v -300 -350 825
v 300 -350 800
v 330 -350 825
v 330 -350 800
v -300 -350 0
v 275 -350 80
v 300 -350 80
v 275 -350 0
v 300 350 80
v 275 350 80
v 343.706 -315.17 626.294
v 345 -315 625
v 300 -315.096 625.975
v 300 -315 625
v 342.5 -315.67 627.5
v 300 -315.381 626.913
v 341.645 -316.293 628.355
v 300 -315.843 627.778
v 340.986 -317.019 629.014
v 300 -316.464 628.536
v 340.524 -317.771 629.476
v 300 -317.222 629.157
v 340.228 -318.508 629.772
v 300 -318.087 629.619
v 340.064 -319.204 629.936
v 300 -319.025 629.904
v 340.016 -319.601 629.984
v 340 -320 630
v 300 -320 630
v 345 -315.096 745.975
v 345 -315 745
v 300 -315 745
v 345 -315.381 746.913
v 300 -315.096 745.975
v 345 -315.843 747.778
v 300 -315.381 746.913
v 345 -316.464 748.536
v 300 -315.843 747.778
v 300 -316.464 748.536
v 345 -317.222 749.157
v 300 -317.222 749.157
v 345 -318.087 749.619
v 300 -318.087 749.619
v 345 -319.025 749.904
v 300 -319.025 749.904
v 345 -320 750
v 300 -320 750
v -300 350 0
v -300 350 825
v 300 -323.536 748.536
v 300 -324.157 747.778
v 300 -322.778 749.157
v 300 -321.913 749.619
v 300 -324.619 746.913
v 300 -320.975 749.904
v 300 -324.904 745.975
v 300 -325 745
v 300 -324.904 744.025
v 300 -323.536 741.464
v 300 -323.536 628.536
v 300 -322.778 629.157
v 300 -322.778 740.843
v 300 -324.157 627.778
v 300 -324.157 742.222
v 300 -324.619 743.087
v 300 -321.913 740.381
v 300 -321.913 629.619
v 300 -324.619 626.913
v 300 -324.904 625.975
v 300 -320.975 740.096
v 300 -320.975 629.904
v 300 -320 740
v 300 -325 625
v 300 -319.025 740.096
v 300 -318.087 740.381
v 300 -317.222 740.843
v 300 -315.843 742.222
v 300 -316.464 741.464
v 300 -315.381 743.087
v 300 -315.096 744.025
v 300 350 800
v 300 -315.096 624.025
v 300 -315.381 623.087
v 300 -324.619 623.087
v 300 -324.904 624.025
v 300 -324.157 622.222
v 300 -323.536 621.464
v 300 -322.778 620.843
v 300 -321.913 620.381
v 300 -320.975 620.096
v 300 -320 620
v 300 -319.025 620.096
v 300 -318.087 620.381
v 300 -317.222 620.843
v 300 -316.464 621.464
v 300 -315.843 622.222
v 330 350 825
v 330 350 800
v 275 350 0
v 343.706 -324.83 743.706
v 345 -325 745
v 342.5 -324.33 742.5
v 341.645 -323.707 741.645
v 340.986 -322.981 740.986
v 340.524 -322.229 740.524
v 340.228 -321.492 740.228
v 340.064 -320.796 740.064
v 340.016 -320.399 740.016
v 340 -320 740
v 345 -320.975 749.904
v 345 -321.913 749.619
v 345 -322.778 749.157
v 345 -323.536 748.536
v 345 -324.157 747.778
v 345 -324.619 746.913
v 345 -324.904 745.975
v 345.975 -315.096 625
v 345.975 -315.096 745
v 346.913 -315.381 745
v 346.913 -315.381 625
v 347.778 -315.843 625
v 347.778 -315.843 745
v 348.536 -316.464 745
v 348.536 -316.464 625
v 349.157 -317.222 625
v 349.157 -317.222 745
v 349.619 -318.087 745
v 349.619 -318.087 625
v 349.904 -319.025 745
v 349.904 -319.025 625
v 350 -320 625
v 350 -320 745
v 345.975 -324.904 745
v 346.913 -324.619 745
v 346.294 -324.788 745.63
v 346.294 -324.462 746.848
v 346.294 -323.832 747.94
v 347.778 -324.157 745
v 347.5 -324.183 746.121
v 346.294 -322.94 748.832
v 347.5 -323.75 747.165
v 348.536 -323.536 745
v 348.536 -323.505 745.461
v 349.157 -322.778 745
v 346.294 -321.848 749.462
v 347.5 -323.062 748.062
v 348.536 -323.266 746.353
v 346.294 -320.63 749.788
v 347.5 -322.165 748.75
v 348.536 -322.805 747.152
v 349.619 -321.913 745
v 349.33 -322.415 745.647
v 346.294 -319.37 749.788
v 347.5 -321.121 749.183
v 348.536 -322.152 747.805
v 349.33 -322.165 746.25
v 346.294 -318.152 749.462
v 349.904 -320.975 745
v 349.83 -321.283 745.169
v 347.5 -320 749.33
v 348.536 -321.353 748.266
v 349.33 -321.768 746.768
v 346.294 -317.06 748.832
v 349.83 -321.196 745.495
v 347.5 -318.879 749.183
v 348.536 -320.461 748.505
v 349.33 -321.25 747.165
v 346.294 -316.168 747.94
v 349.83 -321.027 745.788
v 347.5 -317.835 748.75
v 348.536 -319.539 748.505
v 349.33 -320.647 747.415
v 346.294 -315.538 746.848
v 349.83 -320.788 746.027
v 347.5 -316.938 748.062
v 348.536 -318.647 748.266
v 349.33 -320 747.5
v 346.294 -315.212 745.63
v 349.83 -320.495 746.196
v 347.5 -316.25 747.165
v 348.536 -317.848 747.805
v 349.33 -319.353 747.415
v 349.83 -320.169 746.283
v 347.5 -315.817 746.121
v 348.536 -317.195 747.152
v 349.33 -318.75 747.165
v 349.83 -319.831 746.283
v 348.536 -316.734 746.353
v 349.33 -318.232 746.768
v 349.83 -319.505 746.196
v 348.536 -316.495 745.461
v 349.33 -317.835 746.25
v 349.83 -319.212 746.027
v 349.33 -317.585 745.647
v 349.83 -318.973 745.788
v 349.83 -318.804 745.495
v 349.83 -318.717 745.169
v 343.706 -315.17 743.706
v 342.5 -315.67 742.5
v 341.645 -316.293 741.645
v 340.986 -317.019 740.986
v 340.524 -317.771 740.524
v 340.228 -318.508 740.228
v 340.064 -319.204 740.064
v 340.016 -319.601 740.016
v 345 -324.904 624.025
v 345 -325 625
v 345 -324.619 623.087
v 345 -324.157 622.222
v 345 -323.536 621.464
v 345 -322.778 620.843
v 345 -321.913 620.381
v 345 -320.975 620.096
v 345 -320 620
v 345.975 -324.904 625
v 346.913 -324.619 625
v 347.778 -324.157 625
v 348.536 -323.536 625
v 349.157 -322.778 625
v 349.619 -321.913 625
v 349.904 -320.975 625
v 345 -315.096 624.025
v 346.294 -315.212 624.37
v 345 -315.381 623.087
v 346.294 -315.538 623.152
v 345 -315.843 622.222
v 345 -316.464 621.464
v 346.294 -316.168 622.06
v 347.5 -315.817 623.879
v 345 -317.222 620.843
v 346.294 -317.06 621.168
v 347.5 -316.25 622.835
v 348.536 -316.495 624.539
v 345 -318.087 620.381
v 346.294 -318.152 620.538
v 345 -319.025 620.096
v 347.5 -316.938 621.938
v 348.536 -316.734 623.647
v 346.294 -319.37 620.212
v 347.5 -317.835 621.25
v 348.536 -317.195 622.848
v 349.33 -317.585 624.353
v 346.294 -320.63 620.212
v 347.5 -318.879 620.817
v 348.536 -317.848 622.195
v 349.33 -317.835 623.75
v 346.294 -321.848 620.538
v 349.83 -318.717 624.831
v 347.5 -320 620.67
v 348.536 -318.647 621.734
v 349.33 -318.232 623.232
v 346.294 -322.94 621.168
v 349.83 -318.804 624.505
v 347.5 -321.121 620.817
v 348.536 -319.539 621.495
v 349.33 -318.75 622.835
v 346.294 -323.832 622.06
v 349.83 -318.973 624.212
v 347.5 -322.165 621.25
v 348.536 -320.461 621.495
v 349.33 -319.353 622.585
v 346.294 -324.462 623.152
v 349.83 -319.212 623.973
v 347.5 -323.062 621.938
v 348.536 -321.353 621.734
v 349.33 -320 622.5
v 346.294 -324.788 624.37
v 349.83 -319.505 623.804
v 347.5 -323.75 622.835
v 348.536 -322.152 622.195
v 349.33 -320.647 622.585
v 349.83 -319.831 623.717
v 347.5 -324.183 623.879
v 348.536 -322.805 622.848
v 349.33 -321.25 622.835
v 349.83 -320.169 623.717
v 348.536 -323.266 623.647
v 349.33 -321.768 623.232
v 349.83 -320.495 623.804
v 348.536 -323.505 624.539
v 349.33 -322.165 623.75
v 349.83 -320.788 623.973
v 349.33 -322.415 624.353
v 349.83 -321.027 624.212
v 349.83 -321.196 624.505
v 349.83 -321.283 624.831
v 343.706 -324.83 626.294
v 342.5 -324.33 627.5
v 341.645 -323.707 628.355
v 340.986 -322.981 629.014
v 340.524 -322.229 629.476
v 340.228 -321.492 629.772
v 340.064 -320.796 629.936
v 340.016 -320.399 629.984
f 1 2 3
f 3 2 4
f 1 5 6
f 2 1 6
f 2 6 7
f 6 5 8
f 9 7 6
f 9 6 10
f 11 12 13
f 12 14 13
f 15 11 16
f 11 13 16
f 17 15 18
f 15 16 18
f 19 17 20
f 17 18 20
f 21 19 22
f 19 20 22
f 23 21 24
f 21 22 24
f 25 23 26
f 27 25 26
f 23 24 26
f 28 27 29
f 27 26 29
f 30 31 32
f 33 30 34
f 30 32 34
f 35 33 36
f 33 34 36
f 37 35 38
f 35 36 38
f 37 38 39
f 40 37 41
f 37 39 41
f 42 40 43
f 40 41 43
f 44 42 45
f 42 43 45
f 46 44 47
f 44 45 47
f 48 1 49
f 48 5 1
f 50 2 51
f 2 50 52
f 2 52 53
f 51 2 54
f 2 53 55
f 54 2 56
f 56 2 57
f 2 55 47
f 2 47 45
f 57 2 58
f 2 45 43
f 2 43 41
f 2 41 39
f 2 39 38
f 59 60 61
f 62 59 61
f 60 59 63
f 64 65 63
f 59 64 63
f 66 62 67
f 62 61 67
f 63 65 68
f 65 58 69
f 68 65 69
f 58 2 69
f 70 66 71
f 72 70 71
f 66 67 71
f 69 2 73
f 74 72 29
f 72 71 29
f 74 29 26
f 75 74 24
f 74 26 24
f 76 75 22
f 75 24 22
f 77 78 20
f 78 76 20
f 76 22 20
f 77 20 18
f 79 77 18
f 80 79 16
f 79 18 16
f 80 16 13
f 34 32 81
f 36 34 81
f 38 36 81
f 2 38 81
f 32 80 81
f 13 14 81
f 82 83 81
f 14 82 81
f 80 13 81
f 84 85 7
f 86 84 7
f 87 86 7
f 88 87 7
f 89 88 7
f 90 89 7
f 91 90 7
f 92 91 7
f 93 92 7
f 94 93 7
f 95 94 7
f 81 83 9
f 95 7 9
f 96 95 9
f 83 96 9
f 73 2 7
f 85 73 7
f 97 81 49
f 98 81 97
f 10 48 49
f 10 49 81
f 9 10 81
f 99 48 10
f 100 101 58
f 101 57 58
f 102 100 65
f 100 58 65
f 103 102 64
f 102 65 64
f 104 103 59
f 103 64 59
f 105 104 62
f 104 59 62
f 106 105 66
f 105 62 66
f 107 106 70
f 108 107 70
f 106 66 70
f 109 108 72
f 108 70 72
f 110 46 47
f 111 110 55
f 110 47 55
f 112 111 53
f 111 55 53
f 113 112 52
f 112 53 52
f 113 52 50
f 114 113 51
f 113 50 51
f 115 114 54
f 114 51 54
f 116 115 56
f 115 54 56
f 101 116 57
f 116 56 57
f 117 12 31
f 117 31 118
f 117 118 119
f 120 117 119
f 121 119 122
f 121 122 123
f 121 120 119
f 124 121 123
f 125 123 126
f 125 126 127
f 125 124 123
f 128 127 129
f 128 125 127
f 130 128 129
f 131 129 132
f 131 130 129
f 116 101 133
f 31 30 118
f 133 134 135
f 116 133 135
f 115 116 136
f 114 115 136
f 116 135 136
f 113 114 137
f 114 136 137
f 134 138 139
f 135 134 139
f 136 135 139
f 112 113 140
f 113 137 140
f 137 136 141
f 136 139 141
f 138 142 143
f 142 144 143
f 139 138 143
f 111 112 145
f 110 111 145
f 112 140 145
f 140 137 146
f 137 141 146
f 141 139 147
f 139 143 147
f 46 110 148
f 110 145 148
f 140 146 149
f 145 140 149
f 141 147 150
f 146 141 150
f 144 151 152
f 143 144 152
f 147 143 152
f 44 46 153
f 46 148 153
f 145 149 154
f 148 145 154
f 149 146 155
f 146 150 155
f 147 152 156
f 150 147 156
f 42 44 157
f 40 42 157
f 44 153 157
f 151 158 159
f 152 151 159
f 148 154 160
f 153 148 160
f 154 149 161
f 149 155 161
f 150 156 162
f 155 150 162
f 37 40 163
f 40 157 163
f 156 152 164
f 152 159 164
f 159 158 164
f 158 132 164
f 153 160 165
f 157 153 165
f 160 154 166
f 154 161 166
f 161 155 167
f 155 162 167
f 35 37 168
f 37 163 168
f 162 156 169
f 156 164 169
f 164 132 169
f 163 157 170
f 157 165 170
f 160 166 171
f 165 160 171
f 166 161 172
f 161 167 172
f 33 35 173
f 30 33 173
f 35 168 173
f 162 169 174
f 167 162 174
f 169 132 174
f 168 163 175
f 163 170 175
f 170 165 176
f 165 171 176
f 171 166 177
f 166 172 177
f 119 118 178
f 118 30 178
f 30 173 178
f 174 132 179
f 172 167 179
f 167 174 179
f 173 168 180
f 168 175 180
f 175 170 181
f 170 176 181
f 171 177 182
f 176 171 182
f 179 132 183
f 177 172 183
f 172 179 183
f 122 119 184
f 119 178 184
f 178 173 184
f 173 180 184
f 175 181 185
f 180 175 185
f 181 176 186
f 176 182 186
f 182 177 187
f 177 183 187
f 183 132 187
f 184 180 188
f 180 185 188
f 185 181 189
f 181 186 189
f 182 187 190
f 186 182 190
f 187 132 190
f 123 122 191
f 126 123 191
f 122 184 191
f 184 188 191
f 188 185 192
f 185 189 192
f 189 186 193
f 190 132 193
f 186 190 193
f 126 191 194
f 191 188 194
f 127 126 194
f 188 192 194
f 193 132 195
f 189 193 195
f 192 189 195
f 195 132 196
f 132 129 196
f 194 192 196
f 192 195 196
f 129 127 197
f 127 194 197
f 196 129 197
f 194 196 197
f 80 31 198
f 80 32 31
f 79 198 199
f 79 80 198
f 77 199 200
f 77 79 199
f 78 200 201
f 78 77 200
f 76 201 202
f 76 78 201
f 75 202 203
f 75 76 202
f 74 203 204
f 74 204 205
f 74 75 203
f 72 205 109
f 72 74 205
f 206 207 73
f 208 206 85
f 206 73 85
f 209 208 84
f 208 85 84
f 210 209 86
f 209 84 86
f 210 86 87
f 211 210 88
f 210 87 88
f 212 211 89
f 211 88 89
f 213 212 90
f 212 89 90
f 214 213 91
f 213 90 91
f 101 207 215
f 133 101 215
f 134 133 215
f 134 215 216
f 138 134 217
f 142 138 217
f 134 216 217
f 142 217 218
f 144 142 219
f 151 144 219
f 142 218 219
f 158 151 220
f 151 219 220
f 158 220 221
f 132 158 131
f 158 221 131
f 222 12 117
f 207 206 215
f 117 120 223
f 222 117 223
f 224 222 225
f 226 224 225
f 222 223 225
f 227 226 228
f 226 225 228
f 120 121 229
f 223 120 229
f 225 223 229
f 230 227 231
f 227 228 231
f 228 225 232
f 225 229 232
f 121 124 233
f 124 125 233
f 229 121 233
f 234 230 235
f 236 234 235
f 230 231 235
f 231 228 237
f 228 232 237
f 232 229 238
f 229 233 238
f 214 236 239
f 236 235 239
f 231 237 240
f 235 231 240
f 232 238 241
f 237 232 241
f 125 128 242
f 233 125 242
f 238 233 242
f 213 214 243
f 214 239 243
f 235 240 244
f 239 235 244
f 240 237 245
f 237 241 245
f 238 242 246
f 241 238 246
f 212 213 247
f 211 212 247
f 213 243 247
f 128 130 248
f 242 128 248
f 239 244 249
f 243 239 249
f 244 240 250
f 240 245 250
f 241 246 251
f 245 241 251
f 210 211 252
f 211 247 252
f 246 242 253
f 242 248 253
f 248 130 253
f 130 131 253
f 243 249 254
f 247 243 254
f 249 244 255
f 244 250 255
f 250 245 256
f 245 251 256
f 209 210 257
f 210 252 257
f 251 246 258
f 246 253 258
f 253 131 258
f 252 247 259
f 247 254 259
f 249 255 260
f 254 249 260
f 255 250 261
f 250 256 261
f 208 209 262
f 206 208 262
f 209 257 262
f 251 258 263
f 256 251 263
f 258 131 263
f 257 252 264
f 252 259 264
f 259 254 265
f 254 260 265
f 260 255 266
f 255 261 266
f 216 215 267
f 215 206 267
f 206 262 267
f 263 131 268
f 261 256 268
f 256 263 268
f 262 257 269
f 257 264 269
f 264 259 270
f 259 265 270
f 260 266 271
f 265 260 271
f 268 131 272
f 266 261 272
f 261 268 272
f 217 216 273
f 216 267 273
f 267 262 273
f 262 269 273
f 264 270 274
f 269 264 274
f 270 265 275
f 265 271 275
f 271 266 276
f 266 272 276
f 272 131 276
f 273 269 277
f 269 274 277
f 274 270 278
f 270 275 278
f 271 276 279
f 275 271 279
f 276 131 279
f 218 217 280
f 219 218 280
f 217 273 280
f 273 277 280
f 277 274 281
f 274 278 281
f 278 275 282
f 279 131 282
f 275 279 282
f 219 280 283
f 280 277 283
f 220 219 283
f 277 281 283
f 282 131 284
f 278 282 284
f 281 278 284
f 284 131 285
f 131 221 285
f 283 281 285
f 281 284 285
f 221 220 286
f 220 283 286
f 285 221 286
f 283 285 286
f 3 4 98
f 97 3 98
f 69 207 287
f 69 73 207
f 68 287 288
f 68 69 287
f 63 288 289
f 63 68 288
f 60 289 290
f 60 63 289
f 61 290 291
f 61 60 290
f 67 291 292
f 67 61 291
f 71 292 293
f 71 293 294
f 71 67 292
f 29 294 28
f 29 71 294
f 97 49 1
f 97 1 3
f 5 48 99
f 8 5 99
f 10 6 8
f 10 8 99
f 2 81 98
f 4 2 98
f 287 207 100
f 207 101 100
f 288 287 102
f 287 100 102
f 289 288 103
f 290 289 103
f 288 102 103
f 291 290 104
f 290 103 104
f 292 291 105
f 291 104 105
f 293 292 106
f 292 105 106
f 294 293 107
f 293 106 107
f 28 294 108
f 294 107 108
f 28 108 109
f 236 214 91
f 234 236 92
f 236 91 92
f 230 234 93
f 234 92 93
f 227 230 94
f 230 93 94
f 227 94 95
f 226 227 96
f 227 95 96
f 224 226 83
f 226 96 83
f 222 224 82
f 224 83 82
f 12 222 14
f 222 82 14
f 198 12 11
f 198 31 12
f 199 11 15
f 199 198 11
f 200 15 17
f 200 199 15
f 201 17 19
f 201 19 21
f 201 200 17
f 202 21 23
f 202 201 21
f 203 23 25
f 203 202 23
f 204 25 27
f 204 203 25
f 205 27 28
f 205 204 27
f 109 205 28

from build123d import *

# Parameters (mm, degrees)
F0_W        = 600
F0_H        = 700
F1_DEPTH    = 800
F2_W        = 700
F2_H        = 80
F3_DEPTH    = 25
F5_DEPTH    = 50
F6_T1_DEPTH = 120
F6_T4_ANGLE = 180
F6_T6_ANGLE = 180
F7_W        = 40
F7_H        = 110
F8_DEPTH    = 25
F9_R        = 4.99999
F10_W       = 630
F10_H       = 700
F11_DEPTH   = 25


# Not quite as in the source:
# - a fillet or chamfer that OpenCascade refuses, or shapes differently, is made with other operations: its cross-section is extruded or revolved along the edge and cut away or added
# - a fillet or chamfer is up to 0.001 mm smaller than in the source, because OpenCascade refuses the exact size


with BuildPart() as f1:
    # F0 (on Top) → F1 (new body)
    with BuildSketch(Plane.XY):
        Rectangle(F0_W, F0_H)
    extrude(amount=F1_DEPTH)

    # F2 (on face) → F3 (cut)
    with BuildSketch(Plane.YZ.offset(300)):
        with Locations((0, 40)):
            Rectangle(F2_W, F2_H)
    extrude(amount=-F3_DEPTH, mode=Mode.SUBTRACT)

    # F4 (on face) → F5 (join)
    with BuildSketch(Plane.YZ.offset(300)):
        with BuildLine():
            ThreePointArc((-320, 750), (-323.5355339059, 748.5355339059), (-325, 745))
            Line((-325, 745), (-325, 625))
            ThreePointArc((-325, 625), (-323.5355339059, 621.4644660941), (-320, 620))
            ThreePointArc((-320, 620), (-316.4644660941, 621.4644660941), (-315, 625))
            Line((-315, 625), (-315, 745))
            ThreePointArc((-315, 745), (-316.4644660941, 748.5355339059), (-320, 750))
        make_face()
    extrude(amount=F5_DEPTH)

    # F6: fillet of radius 5 on 4 edges, made by hand

    # F6_s2 → F6_t1 (cut)
    with BuildSketch(Plane.XY.offset(625)):
        with BuildLine():
            ThreePointArc((345, -325), (348.5355339059, -323.5355339059), (350, -320))
            Line((350, -320), (350, -325))
            Line((350, -325), (345, -325))
        make_face()
        with BuildLine():
            ThreePointArc((345, -315), (348.5355339059, -316.4644660941), (350, -320))
            Line((350, -320), (350, -315))
            Line((350, -315), (345, -315))
        make_face()
    extrude(amount=F6_T1_DEPTH, mode=Mode.SUBTRACT)

    # F6_s3 → F6_t4 (revolve, cut)
    with BuildSketch(Plane.XY.offset(745)):
        with BuildLine():
            ThreePointArc((345, -325), (348.5355339059, -323.5355339059), (350, -320))
            Line((350, -320), (350, -325))
            Line((350, -325), (345, -325))
        make_face()
    revolve(axis=Axis((350, -320, 745), (-1, 0, 0)), revolution_arc=F6_T4_ANGLE, mode=Mode.SUBTRACT)

    # F6_s5 → F6_t6 (revolve, cut)
    with BuildSketch(Plane.XY.offset(625)):
        with BuildLine():
            ThreePointArc((345, -315), (348.5355339059, -316.4644660941), (350, -320))
            Line((350, -320), (350, -315))
            Line((350, -315), (345, -315))
        make_face()
    revolve(axis=Axis((350, -320, 625), (-1, 0, 0)), revolution_arc=F6_T6_ANGLE, mode=Mode.SUBTRACT)

    # F7 (on face) → F8 (cut)
    with BuildSketch(Plane(origin=(0, -315, 0), x_dir=(-1, 0, 0), z_dir=(0, 1, 0))):
        with Locations((-320, 685)):
            Rectangle(F7_W, F7_H)
    extrude(amount=-F8_DEPTH, mode=Mode.SUBTRACT)

    # F9 (radius 5 in the source; OpenCascade refuses exactly that, so slightly less here)
    f9_edges = [f1.edges().sort_by_distance(p)[0] for p in [
        (320, -315, 740),
        (340, -315, 685),
        (320, -315, 630),
        (320, -325, 740),
        (340, -325, 685),
        (320, -325, 630),
    ]]
    fillet(f9_edges, radius=F9_R)

    # F10 (on face) → F11 (join)
    with BuildSketch(Plane.XY.offset(800)):
        with Locations((15, 0)):
            Rectangle(F10_W, F10_H)
    extrude(amount=F11_DEPTH)


solid = f1.part
